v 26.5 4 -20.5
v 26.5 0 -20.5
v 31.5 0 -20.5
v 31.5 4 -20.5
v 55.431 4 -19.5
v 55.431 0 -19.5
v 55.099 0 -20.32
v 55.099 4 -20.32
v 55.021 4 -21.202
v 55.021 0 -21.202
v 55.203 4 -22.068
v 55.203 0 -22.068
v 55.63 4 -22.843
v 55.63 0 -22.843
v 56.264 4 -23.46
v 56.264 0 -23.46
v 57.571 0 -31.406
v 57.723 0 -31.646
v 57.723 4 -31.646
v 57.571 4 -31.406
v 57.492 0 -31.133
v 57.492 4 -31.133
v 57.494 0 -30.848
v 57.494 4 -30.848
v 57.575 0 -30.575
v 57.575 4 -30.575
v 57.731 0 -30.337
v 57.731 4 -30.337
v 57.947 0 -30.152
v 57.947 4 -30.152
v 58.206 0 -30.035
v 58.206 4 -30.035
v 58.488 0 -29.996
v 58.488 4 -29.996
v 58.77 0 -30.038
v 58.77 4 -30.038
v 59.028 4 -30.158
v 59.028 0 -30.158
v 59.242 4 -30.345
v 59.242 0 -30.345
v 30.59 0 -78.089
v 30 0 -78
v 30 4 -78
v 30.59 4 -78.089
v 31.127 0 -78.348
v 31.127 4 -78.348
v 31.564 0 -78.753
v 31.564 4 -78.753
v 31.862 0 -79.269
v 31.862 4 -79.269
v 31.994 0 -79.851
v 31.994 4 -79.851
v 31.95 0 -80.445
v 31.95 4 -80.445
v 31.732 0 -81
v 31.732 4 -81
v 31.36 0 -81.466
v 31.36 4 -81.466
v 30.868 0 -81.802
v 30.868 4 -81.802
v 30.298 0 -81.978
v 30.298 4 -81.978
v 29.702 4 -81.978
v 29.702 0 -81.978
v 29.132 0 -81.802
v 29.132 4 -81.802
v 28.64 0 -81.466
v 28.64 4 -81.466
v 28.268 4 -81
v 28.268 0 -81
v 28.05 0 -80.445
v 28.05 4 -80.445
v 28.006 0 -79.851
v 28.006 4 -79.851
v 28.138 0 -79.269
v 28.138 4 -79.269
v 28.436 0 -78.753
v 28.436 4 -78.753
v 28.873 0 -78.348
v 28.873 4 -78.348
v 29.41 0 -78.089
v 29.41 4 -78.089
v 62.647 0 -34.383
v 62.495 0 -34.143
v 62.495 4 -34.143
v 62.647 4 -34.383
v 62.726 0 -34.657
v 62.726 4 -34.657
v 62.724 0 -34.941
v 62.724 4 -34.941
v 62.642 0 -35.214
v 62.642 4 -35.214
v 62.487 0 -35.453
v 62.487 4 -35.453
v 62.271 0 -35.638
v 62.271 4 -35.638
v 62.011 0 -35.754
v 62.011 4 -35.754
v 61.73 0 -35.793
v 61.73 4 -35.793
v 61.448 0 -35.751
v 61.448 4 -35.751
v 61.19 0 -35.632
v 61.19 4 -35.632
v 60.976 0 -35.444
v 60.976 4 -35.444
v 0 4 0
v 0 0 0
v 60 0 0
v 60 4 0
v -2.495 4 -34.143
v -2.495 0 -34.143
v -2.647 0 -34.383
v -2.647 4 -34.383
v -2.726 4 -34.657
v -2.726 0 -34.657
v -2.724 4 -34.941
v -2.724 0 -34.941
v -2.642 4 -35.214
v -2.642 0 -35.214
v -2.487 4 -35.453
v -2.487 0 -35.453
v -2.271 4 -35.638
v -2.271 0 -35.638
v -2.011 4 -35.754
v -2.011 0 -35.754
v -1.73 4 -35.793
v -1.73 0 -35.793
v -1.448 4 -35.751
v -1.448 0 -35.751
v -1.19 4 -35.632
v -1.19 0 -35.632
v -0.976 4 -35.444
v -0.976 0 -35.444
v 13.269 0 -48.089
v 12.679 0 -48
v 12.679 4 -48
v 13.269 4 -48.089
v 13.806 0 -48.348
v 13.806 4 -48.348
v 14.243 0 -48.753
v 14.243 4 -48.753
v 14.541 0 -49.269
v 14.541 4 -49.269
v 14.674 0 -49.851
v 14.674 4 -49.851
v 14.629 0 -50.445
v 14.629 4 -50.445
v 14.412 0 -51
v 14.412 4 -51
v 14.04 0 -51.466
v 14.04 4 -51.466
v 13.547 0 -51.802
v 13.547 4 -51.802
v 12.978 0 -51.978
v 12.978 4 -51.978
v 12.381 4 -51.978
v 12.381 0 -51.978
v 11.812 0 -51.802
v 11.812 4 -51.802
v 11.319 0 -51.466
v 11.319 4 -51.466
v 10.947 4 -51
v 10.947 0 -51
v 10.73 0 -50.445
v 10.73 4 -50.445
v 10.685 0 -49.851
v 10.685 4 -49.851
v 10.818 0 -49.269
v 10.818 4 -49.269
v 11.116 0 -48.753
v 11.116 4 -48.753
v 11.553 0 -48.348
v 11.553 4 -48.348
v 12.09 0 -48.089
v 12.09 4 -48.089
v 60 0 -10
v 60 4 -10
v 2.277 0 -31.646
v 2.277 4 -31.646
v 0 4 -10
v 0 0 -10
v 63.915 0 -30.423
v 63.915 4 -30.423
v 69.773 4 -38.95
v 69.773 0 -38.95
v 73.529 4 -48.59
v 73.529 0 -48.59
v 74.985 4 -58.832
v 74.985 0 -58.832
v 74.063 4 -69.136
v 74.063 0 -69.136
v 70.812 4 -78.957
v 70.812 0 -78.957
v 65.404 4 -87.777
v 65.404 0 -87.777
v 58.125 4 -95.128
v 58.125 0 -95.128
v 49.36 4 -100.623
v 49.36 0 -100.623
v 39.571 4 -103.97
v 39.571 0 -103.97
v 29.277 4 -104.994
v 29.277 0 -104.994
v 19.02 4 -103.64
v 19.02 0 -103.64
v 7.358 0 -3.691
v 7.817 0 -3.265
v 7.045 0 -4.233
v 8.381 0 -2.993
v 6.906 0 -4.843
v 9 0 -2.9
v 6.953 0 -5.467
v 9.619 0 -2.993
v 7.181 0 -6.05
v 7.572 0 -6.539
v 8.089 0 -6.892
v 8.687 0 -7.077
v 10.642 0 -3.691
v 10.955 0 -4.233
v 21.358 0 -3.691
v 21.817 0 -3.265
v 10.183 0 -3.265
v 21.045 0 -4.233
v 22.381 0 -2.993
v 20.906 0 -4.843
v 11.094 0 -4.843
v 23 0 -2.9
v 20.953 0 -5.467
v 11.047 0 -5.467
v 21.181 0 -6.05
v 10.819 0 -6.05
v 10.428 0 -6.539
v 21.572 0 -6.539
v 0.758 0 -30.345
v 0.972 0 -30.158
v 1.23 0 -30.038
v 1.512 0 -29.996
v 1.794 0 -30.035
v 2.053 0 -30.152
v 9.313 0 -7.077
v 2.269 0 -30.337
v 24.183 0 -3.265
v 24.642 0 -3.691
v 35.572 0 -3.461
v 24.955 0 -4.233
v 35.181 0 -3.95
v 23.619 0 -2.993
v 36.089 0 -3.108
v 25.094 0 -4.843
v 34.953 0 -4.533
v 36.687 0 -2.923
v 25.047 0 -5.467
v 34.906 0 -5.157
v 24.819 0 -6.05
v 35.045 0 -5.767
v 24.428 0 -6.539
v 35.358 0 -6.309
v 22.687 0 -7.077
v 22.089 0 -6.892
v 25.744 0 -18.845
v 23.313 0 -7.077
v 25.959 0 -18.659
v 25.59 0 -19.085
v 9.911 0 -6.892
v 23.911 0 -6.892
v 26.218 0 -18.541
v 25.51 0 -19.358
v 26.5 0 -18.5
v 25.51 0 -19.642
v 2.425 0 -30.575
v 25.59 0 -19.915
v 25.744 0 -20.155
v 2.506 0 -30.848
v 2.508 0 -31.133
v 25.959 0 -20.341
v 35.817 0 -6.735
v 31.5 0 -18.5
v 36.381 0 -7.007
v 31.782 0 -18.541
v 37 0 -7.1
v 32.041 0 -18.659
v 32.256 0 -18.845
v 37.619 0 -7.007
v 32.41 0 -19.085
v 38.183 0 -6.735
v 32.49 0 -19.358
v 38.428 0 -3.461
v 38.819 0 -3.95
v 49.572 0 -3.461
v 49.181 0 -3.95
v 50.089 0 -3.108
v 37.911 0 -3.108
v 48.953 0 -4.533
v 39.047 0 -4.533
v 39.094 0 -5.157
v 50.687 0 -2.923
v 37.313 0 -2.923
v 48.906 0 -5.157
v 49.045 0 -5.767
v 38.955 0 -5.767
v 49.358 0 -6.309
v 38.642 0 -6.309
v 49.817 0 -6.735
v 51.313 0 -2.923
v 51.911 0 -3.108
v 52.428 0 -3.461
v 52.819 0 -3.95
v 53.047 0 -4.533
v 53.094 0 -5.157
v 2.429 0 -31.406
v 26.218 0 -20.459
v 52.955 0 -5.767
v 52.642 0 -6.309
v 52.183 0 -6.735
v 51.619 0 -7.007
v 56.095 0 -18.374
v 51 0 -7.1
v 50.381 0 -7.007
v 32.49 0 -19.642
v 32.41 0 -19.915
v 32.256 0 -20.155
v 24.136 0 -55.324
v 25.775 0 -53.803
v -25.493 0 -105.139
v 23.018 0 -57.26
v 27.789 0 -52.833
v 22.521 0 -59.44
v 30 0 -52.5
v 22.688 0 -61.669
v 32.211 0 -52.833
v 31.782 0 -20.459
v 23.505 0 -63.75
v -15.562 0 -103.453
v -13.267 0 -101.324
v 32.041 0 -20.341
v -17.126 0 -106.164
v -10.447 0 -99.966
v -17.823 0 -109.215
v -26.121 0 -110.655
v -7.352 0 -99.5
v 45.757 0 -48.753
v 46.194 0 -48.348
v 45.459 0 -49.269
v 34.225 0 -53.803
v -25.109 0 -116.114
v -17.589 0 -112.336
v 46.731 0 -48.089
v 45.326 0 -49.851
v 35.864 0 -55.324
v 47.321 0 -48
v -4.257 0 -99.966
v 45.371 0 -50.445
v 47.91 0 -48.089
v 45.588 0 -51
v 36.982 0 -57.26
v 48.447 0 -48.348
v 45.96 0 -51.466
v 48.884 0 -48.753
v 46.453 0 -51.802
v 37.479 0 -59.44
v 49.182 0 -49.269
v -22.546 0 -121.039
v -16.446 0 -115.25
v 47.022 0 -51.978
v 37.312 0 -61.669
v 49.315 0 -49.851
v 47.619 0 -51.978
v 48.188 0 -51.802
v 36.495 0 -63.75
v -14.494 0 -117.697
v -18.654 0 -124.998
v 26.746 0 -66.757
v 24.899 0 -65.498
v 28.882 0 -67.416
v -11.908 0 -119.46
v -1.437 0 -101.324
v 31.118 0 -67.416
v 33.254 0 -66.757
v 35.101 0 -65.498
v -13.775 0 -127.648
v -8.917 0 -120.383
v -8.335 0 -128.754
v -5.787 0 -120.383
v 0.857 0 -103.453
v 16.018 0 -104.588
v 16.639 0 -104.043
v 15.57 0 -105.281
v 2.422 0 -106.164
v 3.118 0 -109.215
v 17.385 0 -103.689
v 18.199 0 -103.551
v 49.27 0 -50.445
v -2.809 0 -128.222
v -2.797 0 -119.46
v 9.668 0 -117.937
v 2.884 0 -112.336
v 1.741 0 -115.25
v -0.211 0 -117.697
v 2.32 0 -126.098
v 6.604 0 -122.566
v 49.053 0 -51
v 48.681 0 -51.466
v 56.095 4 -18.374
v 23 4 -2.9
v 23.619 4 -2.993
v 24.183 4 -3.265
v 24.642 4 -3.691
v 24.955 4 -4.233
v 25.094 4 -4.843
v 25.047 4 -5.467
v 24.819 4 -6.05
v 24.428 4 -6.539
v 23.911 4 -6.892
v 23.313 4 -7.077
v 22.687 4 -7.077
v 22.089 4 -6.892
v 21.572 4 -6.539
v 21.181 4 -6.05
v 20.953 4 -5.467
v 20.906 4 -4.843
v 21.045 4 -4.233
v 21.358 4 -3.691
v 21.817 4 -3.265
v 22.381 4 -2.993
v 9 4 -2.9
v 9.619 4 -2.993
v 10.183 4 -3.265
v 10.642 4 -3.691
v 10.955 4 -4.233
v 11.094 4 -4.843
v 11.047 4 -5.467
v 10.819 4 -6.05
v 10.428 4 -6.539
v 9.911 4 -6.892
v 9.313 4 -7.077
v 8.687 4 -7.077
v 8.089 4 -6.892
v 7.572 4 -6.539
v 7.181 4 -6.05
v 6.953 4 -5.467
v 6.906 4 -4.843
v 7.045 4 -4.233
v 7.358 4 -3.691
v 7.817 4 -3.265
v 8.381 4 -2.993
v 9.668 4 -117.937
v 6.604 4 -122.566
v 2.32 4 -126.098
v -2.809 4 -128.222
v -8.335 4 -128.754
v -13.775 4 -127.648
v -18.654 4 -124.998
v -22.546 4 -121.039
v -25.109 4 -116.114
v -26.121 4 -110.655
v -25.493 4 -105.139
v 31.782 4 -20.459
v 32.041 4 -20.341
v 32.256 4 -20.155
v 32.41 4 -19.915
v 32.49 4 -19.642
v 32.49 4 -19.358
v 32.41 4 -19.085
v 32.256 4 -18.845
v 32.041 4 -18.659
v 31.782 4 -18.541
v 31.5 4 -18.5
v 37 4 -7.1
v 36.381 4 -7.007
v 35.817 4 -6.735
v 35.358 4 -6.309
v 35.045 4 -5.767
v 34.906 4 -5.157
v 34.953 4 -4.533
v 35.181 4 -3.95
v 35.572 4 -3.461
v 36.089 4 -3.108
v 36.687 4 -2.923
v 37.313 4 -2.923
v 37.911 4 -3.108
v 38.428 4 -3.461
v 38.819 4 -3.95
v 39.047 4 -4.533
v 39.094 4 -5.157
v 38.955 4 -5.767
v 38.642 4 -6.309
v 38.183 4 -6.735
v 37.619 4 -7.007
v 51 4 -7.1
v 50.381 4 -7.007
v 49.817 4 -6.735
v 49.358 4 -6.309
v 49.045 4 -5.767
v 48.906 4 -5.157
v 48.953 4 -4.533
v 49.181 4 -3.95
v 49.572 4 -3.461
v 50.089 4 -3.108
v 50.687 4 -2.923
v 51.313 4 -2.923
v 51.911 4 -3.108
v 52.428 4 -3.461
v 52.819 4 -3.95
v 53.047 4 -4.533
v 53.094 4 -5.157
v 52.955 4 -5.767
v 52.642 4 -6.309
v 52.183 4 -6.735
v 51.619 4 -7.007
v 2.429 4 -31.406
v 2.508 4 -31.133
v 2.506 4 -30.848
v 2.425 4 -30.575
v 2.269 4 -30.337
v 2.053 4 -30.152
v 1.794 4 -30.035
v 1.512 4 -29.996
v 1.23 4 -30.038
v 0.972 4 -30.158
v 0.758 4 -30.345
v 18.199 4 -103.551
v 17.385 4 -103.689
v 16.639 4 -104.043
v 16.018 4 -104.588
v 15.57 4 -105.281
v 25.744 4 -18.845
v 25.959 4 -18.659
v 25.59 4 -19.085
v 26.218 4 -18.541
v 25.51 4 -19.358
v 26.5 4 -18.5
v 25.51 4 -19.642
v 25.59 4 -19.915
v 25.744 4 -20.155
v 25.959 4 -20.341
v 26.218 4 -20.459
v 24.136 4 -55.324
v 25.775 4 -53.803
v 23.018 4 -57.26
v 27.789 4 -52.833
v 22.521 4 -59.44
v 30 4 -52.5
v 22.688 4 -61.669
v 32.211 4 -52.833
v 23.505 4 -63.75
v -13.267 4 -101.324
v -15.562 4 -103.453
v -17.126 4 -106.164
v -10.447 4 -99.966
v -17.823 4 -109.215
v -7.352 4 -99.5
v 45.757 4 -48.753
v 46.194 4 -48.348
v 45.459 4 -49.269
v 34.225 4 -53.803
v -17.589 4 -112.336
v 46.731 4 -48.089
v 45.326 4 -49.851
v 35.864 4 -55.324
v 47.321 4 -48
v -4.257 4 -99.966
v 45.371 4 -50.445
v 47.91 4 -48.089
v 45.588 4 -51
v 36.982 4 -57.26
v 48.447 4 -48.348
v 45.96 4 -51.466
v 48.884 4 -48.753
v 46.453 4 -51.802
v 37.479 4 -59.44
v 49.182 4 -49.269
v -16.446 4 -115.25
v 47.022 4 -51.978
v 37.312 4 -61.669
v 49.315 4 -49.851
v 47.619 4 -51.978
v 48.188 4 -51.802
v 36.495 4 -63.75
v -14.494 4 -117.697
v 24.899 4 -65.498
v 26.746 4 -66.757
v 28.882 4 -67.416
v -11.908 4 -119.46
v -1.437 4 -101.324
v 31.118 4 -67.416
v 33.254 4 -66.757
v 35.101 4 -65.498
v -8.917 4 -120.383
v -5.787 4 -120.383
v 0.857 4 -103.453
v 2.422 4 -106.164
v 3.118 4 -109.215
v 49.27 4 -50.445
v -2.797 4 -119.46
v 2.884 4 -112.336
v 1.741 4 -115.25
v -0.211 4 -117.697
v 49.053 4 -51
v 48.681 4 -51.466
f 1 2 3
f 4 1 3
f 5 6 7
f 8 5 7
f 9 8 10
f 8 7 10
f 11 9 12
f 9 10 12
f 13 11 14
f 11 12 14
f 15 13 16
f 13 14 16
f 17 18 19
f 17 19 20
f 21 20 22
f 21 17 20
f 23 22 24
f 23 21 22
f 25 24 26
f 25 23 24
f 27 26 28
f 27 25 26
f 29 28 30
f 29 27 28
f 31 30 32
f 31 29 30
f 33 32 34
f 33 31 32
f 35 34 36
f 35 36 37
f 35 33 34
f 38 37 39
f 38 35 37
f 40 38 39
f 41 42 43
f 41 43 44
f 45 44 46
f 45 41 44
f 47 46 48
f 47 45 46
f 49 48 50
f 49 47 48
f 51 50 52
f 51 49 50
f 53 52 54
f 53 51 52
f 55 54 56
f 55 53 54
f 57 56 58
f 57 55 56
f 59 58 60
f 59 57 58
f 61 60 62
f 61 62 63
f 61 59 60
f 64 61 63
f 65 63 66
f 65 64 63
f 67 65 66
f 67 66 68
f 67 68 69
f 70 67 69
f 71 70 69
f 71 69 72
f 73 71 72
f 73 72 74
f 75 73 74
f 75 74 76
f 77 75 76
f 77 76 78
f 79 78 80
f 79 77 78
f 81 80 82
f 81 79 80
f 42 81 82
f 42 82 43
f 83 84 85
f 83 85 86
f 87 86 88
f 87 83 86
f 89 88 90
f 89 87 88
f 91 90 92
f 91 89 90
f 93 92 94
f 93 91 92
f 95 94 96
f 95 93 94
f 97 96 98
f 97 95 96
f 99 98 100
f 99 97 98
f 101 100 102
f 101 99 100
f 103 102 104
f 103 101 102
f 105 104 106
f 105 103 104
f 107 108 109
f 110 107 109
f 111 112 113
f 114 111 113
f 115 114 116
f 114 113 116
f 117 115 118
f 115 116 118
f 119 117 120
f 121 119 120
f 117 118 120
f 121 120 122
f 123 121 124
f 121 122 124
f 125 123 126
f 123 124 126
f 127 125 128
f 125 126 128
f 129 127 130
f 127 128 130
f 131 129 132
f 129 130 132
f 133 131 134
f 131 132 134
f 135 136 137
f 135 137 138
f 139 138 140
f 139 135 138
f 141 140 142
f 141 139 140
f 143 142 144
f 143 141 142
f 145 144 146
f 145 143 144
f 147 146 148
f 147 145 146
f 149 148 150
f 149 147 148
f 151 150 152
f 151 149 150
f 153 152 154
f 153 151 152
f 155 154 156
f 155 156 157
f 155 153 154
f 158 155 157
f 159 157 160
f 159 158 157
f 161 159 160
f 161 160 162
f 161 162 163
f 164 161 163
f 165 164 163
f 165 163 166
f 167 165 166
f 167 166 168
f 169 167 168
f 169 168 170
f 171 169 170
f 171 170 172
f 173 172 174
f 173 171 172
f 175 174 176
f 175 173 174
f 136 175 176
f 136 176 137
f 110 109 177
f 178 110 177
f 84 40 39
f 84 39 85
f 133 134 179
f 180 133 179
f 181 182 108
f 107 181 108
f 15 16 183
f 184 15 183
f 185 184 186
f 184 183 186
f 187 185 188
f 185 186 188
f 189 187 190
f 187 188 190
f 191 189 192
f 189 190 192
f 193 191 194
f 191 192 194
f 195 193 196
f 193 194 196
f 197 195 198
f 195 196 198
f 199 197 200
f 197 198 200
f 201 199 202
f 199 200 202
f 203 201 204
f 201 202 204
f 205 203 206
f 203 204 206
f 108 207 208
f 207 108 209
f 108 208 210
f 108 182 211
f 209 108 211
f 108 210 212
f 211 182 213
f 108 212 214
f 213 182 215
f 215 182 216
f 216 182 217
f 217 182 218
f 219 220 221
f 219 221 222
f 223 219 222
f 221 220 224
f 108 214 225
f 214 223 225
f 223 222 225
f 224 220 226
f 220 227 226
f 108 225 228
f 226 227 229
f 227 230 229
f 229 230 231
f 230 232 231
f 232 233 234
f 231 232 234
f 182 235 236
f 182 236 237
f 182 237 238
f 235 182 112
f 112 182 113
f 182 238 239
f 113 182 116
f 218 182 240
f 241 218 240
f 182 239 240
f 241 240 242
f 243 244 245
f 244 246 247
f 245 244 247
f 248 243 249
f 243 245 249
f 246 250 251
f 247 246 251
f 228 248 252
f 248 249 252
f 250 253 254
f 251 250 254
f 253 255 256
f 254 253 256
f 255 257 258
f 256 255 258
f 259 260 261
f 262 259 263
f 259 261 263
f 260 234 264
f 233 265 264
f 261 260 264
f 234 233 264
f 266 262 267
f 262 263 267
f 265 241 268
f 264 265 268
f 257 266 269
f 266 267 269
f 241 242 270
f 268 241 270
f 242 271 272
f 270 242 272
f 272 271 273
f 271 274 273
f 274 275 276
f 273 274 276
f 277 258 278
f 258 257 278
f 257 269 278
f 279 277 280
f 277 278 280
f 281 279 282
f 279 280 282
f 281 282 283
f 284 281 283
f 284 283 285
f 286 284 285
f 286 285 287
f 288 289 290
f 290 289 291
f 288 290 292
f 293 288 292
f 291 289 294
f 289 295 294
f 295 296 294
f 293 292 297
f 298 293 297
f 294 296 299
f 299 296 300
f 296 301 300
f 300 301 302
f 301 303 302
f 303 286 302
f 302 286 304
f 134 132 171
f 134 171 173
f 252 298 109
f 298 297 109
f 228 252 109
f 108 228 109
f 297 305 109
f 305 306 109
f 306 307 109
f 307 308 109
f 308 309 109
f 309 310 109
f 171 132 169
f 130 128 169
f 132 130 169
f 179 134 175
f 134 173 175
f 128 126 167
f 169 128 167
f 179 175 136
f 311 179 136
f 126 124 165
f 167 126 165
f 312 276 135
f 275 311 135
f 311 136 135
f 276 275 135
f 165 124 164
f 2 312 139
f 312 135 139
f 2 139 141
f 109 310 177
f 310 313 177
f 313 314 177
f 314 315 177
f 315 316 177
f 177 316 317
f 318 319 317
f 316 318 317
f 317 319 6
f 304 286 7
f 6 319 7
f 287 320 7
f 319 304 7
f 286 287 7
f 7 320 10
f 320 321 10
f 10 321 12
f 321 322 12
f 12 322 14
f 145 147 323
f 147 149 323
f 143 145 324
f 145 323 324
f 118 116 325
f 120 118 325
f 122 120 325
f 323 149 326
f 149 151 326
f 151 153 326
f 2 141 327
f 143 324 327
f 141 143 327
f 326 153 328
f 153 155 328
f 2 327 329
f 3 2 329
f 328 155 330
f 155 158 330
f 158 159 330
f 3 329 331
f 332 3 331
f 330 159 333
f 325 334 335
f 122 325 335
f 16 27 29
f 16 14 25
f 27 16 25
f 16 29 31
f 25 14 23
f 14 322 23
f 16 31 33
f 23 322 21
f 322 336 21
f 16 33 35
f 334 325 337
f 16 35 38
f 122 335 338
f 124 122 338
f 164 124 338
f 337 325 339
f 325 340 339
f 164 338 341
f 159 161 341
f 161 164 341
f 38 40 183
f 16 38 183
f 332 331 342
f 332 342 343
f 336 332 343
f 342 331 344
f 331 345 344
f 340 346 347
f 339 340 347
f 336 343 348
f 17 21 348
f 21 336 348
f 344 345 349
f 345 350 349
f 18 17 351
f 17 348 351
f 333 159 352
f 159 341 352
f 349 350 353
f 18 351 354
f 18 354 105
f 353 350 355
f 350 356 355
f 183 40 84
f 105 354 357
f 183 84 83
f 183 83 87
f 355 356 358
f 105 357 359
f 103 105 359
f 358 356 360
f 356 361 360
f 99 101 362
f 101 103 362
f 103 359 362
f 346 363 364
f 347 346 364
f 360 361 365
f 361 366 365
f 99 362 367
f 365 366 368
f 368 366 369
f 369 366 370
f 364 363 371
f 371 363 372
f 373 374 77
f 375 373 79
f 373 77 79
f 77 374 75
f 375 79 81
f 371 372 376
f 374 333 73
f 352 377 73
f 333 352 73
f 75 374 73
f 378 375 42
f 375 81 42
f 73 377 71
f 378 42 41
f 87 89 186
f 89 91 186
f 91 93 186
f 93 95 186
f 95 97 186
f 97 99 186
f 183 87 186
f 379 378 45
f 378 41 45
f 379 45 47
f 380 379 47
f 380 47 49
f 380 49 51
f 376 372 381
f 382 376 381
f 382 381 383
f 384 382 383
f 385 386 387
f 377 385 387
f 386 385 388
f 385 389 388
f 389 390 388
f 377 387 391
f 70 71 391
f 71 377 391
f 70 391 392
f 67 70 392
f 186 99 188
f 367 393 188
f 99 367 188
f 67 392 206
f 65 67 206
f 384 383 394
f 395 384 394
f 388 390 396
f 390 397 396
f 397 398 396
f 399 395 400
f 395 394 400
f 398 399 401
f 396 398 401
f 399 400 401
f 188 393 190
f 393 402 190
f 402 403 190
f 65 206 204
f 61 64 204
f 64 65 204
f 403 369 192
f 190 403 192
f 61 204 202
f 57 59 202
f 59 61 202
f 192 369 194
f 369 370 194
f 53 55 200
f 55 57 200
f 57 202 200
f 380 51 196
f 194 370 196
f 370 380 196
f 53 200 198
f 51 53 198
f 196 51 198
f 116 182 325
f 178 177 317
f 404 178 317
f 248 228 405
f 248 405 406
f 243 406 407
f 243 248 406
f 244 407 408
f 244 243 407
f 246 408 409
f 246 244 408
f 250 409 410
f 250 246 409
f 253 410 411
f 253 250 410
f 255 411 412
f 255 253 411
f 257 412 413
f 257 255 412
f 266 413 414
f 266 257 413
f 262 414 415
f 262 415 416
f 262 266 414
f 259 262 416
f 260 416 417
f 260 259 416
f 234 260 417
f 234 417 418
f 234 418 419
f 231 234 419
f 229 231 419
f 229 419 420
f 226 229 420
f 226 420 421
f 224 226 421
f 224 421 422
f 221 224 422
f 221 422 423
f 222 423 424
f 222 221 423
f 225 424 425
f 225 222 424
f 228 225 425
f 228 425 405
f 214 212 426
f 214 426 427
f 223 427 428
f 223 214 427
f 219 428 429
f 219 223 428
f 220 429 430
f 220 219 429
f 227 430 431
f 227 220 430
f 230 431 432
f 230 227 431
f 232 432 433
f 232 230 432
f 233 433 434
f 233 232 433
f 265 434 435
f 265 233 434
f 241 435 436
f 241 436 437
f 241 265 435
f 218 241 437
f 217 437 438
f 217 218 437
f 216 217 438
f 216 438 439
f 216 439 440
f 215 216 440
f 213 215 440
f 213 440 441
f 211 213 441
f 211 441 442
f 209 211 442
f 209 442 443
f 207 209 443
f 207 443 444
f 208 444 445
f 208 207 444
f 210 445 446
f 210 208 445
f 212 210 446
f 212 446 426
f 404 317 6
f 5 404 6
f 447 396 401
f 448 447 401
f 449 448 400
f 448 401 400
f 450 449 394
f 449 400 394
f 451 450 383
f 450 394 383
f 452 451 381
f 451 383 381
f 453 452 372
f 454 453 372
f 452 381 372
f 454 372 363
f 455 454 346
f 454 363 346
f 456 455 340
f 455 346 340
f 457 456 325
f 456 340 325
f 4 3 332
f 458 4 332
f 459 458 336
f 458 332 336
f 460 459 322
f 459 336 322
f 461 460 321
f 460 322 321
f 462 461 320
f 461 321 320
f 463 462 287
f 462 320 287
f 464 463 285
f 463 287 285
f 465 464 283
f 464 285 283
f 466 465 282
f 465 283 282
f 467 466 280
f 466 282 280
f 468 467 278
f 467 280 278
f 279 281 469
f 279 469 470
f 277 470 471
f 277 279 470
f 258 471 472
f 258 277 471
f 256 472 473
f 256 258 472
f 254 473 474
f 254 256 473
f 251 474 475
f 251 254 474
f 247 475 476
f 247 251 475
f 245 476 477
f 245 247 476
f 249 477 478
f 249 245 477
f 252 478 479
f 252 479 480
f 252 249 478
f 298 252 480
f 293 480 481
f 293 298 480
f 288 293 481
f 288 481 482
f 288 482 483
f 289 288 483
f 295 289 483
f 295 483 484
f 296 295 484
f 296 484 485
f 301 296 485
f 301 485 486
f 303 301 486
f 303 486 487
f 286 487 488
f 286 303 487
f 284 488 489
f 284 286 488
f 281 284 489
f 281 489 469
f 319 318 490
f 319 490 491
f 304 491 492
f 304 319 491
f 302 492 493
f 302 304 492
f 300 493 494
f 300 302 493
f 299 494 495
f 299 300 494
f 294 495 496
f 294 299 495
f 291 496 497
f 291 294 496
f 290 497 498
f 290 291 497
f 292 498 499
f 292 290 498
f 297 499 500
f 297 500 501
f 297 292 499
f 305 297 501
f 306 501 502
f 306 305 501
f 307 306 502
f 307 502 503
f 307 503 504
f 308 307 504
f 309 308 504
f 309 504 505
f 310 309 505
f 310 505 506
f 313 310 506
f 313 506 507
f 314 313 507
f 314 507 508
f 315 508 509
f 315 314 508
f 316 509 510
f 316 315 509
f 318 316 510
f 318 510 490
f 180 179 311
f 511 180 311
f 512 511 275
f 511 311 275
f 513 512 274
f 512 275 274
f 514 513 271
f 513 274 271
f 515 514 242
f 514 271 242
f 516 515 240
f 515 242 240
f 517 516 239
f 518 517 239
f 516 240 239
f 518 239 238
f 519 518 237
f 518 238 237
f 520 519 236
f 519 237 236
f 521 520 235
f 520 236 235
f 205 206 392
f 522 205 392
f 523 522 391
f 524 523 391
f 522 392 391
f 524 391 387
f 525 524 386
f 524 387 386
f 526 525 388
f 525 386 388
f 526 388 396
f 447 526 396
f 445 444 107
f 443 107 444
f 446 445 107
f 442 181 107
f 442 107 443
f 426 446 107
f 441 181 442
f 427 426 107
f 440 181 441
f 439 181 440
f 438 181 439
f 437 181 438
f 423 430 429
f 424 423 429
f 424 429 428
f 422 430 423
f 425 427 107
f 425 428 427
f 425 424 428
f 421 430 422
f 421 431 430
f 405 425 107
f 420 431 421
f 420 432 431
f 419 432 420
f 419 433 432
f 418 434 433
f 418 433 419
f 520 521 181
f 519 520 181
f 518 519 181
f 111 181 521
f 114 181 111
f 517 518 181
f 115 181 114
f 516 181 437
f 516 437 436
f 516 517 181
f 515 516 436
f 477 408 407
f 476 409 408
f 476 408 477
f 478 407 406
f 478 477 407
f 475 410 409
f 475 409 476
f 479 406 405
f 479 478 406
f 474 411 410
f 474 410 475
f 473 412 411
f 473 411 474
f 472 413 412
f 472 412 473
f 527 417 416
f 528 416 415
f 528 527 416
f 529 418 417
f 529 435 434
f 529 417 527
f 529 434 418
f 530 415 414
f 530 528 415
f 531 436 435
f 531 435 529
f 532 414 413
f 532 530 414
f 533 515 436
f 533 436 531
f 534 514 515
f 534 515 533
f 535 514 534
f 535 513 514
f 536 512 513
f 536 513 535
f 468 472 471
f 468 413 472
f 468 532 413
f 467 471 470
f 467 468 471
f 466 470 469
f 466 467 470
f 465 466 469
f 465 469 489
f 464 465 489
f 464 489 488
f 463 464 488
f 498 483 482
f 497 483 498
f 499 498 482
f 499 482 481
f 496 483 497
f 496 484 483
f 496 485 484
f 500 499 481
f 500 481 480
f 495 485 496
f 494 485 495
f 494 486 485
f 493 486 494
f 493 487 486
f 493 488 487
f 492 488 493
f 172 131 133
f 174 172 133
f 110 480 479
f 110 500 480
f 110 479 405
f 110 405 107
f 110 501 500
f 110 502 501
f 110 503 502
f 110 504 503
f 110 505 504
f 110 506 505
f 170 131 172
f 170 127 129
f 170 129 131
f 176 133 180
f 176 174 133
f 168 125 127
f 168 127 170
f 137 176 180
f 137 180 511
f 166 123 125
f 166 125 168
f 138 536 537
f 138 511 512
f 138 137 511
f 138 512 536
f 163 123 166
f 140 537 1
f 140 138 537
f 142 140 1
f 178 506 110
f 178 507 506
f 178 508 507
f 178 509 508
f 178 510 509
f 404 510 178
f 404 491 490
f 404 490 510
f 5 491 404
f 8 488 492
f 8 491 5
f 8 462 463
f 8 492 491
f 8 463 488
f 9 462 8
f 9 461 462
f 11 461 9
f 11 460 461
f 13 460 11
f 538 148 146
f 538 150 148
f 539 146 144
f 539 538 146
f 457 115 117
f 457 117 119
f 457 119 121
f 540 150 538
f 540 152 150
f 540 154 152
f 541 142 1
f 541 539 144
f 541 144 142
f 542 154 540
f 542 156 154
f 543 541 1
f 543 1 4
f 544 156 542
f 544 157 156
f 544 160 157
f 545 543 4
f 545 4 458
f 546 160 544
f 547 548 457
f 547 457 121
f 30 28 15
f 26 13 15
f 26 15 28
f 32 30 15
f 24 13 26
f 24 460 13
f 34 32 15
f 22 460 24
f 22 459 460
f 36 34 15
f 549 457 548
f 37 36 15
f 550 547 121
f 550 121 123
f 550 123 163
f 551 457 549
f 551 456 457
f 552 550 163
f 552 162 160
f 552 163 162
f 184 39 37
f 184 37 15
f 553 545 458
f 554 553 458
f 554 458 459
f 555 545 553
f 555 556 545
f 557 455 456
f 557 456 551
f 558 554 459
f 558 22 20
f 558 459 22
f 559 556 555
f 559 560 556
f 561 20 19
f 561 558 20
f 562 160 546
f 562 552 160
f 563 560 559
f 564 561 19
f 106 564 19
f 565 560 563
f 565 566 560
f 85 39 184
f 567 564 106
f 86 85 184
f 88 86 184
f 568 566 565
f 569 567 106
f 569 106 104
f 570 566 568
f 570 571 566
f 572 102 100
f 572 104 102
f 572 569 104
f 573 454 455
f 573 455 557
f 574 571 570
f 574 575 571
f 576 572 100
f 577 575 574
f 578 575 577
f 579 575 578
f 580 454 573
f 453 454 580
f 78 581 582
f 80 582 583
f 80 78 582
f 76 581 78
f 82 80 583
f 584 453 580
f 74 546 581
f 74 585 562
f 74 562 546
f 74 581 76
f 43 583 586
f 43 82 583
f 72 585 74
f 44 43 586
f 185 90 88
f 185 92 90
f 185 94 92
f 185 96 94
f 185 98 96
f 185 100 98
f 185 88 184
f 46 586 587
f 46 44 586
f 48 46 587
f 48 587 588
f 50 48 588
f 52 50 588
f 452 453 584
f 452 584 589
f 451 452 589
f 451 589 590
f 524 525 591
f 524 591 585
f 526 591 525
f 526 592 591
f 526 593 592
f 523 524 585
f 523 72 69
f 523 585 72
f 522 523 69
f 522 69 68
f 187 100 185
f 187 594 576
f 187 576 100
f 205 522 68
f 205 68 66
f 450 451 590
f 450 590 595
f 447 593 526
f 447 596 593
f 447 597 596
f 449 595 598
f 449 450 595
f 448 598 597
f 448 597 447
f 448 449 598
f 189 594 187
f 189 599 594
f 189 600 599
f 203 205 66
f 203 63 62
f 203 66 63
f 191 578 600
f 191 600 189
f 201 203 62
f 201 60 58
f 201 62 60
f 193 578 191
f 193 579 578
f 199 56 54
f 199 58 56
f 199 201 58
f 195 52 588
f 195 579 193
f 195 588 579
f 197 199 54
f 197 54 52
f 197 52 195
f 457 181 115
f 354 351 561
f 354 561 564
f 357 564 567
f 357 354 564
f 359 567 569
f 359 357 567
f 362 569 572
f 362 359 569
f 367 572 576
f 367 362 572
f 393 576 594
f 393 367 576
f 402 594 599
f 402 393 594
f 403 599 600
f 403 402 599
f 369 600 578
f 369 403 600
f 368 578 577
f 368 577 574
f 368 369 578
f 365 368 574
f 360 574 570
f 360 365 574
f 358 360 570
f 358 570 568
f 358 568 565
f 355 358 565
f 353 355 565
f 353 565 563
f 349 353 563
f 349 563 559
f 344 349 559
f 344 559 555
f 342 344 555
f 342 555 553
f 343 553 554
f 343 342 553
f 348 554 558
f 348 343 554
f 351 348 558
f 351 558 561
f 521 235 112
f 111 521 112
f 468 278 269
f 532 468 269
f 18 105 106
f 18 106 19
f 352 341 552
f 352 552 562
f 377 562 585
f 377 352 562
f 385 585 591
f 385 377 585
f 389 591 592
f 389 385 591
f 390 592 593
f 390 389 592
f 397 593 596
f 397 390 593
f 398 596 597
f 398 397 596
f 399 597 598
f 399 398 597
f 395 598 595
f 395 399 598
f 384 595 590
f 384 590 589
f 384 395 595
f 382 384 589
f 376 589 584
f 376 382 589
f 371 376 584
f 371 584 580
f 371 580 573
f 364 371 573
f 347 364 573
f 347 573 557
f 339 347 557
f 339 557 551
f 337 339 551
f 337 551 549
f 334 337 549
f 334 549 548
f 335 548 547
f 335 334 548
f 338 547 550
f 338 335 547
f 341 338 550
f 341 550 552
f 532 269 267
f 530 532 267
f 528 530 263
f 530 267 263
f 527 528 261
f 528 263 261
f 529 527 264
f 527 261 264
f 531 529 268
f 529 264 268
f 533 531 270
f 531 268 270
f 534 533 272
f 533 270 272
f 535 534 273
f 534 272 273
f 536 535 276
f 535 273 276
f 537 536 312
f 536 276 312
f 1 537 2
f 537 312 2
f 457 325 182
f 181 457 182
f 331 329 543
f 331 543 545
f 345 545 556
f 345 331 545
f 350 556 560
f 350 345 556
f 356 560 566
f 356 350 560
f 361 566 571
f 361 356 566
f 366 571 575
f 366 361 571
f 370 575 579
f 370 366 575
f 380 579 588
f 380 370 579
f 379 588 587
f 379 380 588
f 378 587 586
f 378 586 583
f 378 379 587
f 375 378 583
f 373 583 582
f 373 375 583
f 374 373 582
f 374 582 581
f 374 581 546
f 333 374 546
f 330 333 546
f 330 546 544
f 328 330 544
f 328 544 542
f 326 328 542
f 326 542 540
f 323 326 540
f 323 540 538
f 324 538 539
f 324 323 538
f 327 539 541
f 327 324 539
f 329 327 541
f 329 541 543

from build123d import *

# Parameters (mm, degrees)
SKETCH_1_R      = 10.5
SKETCH_1_R_2    = 7.5
SKETCH_1_R_3    = 2
SKETCH_1_R_4    = 2.1
EXTRUDE_1_DEPTH = 4


with BuildPart() as part:
    # 草图1 → 凸台-拉伸1 (new body)
    with BuildSketch(Plane(origin=(0, 0, 0), x_dir=(1, 0, 0), z_dir=(0, 1, 0))):
        with BuildLine():
            Line((0, 10), (0, 0))
            Line((0, 0), (60, 0))
            Line((60, 0), (60, 10))
            Line((60, 10), (56.095182285, 18.373908614))
            Line((56.095182285, 18.373908614), (55.431150168, 19.5))
            ThreePointArc((55.431150168, 19.5), (55.079606541, 21.641551662), (56.264363658, 23.459841248))
            ThreePointArc((56.264363658, 23.459841248), (70.812010618, 78.957314928), (19.020417199, 103.639990393))
            ThreePointArc((19.020417199, 103.639990393), (16.99979992, 103.840191523), (15.569521651, 105.281468301))
            Line((15.569521651, 105.281468301), (9.668235965, 117.936816295))
            ThreePointArc((9.668235965, 117.936816295), (-13.775496492, 127.647528231), (-25.492512153, 105.139350566))
            Line((-25.492512153, 105.139350566), (0, 10))
        make_face()
        with Locations(Location((-7.352321507, 110, 0), (0, 0, 270))):
            Circle(SKETCH_1_R, mode=Mode.SUBTRACT)
        with Locations(Location((30, 60, 0), (0, 0, 270))):
            Circle(SKETCH_1_R_2, mode=Mode.SUBTRACT)
        with Locations(Location((30, 80, 0), (0, 0, 270))):
            Circle(SKETCH_1_R_3, mode=Mode.SUBTRACT)
        with Locations(Location((47.320508076, 50, 0), (0, 0, 270))):
            Circle(SKETCH_1_R_3, mode=Mode.SUBTRACT)
        with Locations(Location((12.679491924, 50, 0), (0, 0, 270))):
            Circle(SKETCH_1_R_3, mode=Mode.SUBTRACT)
        with Locations(Location((23, 5, 0), (0, 0, 270))):
            Circle(SKETCH_1_R_4, mode=Mode.SUBTRACT)
        with Locations(Location((9, 5, 0), (0, 0, 270))):
            Circle(SKETCH_1_R_4, mode=Mode.SUBTRACT)
        with Locations(Location((37, 5, 0), (0, 0, 90))):
            Circle(SKETCH_1_R_4, mode=Mode.SUBTRACT)
        with Locations(Location((51, 5, 0), (0, 0, 90))):
            Circle(SKETCH_1_R_4, mode=Mode.SUBTRACT)
        with BuildLine():
            Line((26.5, 20.5), (31.5, 20.5))
            ThreePointArc((31.5, 20.5), (32.5, 19.5), (31.5, 18.5))
            Line((31.5, 18.5), (26.5, 18.5))
            ThreePointArc((26.5, 18.5), (25.5, 19.5), (26.5, 20.5))
        make_face(mode=Mode.SUBTRACT)
        with BuildLine():
            Line((-0.975772037, 35.443910191), (2.27680142, 31.646441837))
            ThreePointArc((2.27680142, 31.646441837), (2.167822441, 30.236433474), (0.757814079, 30.345412454))
            Line((0.757814079, 30.345412454), (-2.494759379, 34.142880808))
            ThreePointArc((-2.494759379, 34.142880808), (-2.3857804, 35.552889171), (-0.975772037, 35.443910191))
        make_face(mode=Mode.SUBTRACT)
        with BuildLine():
            Line((60.975772037, 35.443910191), (57.72319858, 31.646441837))
            ThreePointArc((57.72319858, 31.646441837), (57.832177559, 30.236433474), (59.242185921, 30.345412454))
            Line((59.242185921, 30.345412454), (62.494759379, 34.142880808))
            ThreePointArc((62.494759379, 34.142880808), (62.3857804, 35.552889171), (60.975772037, 35.443910191))
        make_face(mode=Mode.SUBTRACT)
    extrude(amount=EXTRUDE_1_DEPTH)


solid = part.part
